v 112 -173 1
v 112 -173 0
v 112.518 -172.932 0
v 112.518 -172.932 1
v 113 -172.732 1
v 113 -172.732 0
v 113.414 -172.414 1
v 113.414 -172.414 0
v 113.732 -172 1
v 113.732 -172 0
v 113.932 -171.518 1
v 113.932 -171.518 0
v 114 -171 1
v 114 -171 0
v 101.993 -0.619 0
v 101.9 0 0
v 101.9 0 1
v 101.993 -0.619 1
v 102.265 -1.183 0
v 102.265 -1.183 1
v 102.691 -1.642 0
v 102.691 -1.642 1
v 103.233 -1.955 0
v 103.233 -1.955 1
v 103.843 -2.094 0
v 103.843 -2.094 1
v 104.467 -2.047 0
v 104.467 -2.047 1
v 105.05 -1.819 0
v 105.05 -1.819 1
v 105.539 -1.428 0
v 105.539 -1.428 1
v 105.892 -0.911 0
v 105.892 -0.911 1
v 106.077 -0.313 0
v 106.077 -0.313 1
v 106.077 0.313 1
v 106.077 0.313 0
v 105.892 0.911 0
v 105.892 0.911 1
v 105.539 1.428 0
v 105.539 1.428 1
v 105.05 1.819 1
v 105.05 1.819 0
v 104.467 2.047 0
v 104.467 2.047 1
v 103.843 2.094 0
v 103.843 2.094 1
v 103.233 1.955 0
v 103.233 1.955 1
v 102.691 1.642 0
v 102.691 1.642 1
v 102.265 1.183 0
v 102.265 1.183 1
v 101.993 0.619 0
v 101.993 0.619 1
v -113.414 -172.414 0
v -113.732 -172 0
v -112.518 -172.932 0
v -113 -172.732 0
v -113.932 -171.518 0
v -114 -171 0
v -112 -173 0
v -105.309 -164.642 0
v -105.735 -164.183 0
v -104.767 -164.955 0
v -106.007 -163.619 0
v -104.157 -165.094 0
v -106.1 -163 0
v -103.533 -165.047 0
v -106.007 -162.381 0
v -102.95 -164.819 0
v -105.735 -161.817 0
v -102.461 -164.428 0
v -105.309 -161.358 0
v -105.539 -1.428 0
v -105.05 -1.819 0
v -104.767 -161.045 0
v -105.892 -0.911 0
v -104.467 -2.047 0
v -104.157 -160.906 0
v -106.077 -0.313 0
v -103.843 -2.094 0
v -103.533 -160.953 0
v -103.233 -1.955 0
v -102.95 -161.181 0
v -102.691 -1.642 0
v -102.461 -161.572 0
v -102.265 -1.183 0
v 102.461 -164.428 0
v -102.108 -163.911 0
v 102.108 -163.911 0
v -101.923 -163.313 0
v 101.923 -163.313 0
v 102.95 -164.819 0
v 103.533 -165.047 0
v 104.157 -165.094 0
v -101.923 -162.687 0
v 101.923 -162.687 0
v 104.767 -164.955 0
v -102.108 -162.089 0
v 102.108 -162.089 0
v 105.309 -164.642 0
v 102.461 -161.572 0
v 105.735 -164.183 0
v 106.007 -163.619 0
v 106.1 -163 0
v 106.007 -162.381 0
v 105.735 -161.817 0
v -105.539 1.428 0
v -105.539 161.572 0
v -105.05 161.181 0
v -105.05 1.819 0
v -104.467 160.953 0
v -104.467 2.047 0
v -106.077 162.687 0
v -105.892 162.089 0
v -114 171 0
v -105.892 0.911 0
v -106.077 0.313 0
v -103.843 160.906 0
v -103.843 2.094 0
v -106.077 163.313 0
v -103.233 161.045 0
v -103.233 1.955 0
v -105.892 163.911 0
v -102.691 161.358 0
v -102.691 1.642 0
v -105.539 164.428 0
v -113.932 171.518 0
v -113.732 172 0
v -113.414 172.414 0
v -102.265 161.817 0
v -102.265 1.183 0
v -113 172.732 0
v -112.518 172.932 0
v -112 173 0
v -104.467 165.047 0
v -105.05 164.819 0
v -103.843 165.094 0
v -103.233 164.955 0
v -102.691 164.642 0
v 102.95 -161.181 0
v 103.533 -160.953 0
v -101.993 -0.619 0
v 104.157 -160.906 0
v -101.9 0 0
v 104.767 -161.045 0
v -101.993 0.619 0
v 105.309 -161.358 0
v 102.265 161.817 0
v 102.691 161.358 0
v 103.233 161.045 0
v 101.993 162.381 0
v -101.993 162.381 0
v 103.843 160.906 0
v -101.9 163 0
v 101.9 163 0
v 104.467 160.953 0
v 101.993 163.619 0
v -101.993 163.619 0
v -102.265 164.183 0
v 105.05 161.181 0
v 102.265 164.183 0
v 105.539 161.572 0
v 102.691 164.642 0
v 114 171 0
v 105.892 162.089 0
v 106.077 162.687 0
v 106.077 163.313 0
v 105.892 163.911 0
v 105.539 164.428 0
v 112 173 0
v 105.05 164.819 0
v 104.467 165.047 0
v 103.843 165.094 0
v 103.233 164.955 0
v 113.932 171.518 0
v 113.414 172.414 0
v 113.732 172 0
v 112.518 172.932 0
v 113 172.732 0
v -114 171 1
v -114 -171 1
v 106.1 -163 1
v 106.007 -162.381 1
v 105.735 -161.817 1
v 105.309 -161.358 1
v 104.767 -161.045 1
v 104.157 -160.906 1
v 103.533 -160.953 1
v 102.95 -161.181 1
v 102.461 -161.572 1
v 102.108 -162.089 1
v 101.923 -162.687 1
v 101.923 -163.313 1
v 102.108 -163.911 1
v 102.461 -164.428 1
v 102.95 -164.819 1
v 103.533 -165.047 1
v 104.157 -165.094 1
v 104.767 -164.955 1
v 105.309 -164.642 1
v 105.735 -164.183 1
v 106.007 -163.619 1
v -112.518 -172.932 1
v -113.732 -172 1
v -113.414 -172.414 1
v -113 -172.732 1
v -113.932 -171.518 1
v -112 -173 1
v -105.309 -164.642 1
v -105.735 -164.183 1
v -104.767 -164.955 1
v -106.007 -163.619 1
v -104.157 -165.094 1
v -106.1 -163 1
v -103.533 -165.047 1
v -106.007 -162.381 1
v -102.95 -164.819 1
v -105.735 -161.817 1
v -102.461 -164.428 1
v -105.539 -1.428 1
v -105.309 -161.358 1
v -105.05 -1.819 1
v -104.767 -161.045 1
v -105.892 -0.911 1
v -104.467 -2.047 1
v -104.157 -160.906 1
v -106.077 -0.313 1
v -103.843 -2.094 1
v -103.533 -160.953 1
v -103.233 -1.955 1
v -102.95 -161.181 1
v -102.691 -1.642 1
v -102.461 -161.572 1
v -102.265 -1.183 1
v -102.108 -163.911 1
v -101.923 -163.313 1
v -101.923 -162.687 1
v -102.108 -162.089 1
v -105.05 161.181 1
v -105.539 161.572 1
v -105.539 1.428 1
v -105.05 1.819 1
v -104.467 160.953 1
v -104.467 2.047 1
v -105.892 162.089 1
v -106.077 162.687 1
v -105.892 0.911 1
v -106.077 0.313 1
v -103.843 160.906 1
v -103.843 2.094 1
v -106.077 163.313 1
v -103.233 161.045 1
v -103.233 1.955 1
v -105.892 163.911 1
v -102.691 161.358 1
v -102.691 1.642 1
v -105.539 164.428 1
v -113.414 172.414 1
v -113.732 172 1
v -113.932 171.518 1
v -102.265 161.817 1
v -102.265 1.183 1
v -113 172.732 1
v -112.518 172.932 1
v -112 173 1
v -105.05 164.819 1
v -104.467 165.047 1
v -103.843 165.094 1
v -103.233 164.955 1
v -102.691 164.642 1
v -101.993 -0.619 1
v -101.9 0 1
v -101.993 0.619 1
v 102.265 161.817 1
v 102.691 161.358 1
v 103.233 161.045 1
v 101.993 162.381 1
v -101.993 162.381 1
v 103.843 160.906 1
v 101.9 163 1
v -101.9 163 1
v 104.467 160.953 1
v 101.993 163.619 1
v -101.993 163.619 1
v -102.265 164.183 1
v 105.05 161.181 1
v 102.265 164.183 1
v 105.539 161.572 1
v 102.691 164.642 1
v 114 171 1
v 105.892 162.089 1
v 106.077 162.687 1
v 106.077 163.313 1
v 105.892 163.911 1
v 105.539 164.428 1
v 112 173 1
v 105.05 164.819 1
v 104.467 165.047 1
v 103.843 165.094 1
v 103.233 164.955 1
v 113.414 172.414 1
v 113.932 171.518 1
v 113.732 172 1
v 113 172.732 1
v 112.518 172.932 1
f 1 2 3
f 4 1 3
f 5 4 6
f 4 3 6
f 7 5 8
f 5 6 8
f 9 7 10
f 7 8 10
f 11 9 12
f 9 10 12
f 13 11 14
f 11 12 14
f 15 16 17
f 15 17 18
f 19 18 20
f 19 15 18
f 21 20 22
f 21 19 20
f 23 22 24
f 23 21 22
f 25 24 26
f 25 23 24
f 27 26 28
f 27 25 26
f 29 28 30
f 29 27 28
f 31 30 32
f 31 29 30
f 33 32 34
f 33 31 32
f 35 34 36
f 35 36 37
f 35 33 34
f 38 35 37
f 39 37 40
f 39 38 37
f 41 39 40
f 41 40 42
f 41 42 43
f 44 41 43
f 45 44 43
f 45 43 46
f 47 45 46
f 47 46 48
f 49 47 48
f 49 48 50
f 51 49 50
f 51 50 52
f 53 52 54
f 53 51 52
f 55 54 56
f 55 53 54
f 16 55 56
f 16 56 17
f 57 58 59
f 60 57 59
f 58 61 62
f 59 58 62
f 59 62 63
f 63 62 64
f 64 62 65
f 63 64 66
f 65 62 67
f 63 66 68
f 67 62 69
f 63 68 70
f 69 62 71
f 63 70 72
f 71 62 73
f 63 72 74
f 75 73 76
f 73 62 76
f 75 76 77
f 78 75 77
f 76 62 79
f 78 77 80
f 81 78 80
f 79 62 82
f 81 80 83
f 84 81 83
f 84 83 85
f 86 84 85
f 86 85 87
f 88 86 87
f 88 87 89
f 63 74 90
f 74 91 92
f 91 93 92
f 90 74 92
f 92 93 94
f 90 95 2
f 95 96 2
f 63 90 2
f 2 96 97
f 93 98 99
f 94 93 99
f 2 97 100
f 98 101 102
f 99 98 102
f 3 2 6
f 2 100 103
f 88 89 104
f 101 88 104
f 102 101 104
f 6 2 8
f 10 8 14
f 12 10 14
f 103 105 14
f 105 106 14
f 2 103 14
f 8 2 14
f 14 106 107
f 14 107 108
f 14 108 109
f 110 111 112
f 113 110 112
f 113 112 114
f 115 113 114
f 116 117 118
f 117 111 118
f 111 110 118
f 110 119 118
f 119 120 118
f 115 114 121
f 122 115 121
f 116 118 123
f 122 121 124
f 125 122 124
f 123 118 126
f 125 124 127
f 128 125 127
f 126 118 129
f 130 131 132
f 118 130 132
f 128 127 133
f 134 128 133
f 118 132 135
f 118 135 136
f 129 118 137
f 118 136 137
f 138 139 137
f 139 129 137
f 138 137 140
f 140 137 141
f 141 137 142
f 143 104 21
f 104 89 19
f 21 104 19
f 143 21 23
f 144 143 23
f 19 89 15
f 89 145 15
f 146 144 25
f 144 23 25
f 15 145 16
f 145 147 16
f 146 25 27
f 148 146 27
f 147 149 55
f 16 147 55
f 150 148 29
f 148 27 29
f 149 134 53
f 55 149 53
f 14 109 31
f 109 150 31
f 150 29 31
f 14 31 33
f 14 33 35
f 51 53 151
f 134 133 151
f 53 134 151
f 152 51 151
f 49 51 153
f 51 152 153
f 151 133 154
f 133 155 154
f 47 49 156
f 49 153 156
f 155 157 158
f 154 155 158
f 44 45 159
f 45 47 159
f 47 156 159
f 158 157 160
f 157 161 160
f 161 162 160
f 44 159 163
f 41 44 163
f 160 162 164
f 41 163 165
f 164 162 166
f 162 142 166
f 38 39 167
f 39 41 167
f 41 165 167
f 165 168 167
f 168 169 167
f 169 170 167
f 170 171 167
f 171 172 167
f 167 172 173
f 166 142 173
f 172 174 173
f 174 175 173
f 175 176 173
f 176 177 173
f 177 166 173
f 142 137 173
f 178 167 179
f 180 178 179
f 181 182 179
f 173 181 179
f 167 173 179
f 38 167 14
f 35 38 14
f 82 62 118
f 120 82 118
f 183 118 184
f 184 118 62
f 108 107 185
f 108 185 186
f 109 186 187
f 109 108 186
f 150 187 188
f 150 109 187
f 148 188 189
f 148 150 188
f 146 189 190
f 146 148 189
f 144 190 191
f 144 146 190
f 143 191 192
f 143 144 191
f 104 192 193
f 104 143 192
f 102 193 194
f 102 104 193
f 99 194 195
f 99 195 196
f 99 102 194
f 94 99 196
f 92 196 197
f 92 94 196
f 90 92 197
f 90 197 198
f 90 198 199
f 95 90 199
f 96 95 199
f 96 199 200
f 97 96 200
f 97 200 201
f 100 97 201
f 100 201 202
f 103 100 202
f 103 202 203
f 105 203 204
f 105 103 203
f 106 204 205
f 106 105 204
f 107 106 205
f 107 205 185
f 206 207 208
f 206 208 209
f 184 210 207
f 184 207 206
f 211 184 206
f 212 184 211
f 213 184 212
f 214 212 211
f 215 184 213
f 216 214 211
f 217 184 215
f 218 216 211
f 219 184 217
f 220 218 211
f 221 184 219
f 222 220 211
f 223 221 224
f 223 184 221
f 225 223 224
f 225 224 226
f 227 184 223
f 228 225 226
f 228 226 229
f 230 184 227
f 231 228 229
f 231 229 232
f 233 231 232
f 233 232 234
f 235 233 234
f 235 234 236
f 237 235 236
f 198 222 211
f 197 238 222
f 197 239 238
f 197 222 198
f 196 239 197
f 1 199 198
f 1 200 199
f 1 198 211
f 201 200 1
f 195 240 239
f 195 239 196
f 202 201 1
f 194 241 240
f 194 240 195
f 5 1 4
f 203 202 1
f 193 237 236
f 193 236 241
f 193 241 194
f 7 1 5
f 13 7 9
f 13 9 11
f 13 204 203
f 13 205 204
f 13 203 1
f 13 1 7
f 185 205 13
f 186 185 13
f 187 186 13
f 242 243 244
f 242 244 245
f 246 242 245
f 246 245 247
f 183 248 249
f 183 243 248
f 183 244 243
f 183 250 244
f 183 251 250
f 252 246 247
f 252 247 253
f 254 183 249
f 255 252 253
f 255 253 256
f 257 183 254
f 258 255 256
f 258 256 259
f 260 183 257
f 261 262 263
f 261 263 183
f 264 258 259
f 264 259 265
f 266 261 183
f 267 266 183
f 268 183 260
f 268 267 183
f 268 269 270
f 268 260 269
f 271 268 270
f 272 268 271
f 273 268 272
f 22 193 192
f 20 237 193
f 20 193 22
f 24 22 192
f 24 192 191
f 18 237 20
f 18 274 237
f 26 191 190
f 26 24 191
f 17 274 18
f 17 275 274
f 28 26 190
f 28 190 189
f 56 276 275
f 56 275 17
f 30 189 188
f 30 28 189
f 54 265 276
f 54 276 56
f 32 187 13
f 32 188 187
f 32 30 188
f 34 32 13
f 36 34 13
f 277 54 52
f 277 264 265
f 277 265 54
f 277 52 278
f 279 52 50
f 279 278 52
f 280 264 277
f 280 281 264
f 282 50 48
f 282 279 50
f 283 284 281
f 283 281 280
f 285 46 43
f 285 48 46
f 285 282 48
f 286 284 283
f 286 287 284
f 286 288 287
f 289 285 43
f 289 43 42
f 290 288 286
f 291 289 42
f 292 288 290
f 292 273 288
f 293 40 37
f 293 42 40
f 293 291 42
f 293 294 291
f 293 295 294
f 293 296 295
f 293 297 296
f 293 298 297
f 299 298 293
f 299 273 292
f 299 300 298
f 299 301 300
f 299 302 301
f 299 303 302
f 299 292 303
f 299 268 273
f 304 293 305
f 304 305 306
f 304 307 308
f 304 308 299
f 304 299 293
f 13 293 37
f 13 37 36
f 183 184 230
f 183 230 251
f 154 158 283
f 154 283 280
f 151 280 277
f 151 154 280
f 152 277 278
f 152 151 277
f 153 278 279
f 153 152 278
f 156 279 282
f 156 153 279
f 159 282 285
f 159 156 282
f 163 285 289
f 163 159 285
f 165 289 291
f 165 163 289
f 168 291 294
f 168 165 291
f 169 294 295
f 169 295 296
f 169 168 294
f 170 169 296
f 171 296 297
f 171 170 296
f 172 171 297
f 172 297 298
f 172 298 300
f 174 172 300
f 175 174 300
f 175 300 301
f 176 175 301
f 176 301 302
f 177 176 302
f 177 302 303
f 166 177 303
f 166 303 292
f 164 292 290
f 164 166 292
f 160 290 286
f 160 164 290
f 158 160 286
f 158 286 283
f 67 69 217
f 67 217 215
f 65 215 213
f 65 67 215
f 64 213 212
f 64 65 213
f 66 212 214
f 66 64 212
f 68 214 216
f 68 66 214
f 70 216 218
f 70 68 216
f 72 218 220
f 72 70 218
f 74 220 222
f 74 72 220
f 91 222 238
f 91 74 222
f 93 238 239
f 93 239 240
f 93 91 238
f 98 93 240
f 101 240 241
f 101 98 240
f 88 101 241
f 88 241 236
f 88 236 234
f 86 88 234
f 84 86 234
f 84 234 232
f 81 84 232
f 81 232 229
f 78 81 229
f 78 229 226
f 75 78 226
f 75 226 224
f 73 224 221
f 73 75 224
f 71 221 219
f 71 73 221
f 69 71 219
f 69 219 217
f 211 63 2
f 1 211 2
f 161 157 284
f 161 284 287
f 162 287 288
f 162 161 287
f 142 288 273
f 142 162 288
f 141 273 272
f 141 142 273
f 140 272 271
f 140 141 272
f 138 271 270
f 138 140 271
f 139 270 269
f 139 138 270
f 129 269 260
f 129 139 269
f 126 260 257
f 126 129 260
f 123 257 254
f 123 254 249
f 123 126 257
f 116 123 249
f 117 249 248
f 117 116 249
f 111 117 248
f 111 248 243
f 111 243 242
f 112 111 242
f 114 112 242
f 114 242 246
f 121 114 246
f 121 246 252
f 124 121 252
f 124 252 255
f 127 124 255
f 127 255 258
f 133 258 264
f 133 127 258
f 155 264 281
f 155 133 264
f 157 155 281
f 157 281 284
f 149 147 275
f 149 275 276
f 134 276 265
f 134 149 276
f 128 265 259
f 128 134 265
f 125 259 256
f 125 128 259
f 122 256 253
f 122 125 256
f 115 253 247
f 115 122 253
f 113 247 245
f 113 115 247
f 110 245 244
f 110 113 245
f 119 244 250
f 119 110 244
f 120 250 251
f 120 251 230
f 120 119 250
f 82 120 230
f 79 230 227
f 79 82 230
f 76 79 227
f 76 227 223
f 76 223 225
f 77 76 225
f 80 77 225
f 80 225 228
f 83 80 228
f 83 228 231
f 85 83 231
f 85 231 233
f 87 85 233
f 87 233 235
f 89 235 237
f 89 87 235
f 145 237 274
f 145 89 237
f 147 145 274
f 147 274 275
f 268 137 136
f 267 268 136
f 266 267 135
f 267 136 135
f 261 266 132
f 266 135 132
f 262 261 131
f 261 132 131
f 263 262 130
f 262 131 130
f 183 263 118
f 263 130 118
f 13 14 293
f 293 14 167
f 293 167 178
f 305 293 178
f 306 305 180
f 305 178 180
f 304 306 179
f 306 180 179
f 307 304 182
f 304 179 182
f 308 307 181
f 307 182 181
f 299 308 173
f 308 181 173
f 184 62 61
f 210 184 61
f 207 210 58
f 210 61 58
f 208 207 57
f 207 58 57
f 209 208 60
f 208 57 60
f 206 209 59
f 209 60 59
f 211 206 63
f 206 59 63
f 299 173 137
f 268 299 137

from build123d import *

# Parameters (mm, degrees)
SKETCH_1_R      = 2.1
EXTRUDE_1_DEPTH = 1


with BuildPart() as part:
    # Эскиз1 → Вытянуть1 (new body)
    with BuildSketch(Plane.XY):
        with BuildLine():
            Line((-112, -173), (112, -173))
            ThreePointArc((112, -173), (113.414213562, -172.414213562), (114, -171))
            Line((114, -171), (114, 171))
            ThreePointArc((114, 171), (113.414213562, 172.414213562), (112, 173))
            Line((112, 173), (-112, 173))
            ThreePointArc((-112, 173), (-113.414213562, 172.414213562), (-114, 171))
            Line((-114, 171), (-114, -171))
            ThreePointArc((-114, -171), (-113.414213562, -172.414213562), (-112, -173))
        make_face()
        with Locations((-104, 163)):
            Circle(SKETCH_1_R, mode=Mode.SUBTRACT)
        with Locations((-104, 0)):
            Circle(SKETCH_1_R, mode=Mode.SUBTRACT)
        with Locations(Location((-104, -163, 0), (0, 0, 180))):
            Circle(SKETCH_1_R, mode=Mode.SUBTRACT)
        with Locations((104, -163)):
            Circle(SKETCH_1_R, mode=Mode.SUBTRACT)
        with Locations(Location((104, 0, 0), (0, 0, 180))):
            Circle(SKETCH_1_R, mode=Mode.SUBTRACT)
        with Locations(Location((104, 163, 0), (0, 0, 180))):
            Circle(SKETCH_1_R, mode=Mode.SUBTRACT)
    extrude(amount=EXTRUDE_1_DEPTH)


solid = part.part
